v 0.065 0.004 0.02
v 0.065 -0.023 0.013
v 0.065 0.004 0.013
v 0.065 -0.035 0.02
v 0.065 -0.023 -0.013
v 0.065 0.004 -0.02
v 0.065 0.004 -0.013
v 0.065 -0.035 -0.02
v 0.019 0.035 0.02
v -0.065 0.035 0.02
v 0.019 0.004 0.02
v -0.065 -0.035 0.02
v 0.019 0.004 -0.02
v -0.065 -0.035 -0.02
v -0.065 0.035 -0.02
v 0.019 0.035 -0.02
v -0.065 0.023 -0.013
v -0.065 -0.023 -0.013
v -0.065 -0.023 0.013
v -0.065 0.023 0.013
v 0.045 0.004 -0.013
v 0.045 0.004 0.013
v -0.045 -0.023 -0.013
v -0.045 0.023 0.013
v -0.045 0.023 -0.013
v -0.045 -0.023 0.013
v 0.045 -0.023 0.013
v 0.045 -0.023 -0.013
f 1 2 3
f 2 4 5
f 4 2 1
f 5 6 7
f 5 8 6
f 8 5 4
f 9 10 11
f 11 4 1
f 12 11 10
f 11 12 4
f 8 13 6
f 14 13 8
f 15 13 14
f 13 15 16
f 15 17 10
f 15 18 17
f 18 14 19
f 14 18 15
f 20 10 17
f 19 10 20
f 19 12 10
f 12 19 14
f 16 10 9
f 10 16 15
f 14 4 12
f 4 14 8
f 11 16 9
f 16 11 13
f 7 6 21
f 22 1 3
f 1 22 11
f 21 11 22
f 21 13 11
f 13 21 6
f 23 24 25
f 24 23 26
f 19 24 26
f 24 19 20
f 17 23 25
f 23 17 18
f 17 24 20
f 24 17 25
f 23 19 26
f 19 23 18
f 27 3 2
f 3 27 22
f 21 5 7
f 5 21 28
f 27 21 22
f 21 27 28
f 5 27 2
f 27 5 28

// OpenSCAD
// Long rectangular prismatic block with stepped (L-shaped) planform
// and TWO centered U-shaped notches cut into opposite end faces.
// Units: mm

// Overall size (elongated along X)
L = 0.13;
W = 0.07;
H = 0.04;

// Step parameters to create an L-shaped planform in TOP view
step_L = 0.045;   // extent along X removed
step_W = 0.03;    // extent along Y removed

// U-notch parameters (cut into end faces along X)
notch_depth = 0.020;      // depth into the part along X
notch_height = 0.026;     // opening height along Z
notch_side_wall = 0.012;  // remaining wall on each side along Y (U-legs)

// Robust boolean epsilon / overlap
eps = 0.001;

// Main L-shaped planform block (extruded in Z)
// IMPORTANT: The corner removal is positioned so it actually removes the +X,+Y corner
// of the centered cube, producing an L-shaped footprint in TOP view.
module main_block_L_planform() {
    difference() {
        cube([L, W, H], center=true);

        // Remove +X,+Y corner prism:
        // Cutter spans x: [L/2-step_L, L/2], y: [W/2-step_W, W/2]
        // With center=true, place cutter center at:
        // x = L/2 - step_L/2, y = W/2 - step_W/2
        translate([ L/2 - step_L/2, W/2 - step_W/2, 0 ])
            cube([step_L + 2*eps, step_W + 2*eps, H + 2*eps], center=true);
    }
}

// Centered U-shaped notch cut from an end face (x = +/- L/2).
// Implemented as a rectangular recess that opens from the end face,
// leaving side walls (U-legs) along Y. Centered in Y and Z.
module end_u_notch(x_sign=1) {
    notch_w = max(eps, W - 2*notch_side_wall);
    notch_h = min(notch_height, H - 2*eps);

    // End face is at x = x_sign*(L/2).
    // Cutter extends slightly past the end face for a clean boolean:
    // Center at x = x_sign*(L/2 - (notch_depth/2) + eps)
    translate([ x_sign*(L/2 - notch_depth/2 + eps), 0, 0 ])
        cube([notch_depth + 2*eps, notch_w, notch_h], center=true);
}

difference() {
    // Single connected solid body
    main_block_L_planform();

    // Two matching centered U-notches on opposite end faces
    end_u_notch(-1);
    end_u_notch( 1);
}
